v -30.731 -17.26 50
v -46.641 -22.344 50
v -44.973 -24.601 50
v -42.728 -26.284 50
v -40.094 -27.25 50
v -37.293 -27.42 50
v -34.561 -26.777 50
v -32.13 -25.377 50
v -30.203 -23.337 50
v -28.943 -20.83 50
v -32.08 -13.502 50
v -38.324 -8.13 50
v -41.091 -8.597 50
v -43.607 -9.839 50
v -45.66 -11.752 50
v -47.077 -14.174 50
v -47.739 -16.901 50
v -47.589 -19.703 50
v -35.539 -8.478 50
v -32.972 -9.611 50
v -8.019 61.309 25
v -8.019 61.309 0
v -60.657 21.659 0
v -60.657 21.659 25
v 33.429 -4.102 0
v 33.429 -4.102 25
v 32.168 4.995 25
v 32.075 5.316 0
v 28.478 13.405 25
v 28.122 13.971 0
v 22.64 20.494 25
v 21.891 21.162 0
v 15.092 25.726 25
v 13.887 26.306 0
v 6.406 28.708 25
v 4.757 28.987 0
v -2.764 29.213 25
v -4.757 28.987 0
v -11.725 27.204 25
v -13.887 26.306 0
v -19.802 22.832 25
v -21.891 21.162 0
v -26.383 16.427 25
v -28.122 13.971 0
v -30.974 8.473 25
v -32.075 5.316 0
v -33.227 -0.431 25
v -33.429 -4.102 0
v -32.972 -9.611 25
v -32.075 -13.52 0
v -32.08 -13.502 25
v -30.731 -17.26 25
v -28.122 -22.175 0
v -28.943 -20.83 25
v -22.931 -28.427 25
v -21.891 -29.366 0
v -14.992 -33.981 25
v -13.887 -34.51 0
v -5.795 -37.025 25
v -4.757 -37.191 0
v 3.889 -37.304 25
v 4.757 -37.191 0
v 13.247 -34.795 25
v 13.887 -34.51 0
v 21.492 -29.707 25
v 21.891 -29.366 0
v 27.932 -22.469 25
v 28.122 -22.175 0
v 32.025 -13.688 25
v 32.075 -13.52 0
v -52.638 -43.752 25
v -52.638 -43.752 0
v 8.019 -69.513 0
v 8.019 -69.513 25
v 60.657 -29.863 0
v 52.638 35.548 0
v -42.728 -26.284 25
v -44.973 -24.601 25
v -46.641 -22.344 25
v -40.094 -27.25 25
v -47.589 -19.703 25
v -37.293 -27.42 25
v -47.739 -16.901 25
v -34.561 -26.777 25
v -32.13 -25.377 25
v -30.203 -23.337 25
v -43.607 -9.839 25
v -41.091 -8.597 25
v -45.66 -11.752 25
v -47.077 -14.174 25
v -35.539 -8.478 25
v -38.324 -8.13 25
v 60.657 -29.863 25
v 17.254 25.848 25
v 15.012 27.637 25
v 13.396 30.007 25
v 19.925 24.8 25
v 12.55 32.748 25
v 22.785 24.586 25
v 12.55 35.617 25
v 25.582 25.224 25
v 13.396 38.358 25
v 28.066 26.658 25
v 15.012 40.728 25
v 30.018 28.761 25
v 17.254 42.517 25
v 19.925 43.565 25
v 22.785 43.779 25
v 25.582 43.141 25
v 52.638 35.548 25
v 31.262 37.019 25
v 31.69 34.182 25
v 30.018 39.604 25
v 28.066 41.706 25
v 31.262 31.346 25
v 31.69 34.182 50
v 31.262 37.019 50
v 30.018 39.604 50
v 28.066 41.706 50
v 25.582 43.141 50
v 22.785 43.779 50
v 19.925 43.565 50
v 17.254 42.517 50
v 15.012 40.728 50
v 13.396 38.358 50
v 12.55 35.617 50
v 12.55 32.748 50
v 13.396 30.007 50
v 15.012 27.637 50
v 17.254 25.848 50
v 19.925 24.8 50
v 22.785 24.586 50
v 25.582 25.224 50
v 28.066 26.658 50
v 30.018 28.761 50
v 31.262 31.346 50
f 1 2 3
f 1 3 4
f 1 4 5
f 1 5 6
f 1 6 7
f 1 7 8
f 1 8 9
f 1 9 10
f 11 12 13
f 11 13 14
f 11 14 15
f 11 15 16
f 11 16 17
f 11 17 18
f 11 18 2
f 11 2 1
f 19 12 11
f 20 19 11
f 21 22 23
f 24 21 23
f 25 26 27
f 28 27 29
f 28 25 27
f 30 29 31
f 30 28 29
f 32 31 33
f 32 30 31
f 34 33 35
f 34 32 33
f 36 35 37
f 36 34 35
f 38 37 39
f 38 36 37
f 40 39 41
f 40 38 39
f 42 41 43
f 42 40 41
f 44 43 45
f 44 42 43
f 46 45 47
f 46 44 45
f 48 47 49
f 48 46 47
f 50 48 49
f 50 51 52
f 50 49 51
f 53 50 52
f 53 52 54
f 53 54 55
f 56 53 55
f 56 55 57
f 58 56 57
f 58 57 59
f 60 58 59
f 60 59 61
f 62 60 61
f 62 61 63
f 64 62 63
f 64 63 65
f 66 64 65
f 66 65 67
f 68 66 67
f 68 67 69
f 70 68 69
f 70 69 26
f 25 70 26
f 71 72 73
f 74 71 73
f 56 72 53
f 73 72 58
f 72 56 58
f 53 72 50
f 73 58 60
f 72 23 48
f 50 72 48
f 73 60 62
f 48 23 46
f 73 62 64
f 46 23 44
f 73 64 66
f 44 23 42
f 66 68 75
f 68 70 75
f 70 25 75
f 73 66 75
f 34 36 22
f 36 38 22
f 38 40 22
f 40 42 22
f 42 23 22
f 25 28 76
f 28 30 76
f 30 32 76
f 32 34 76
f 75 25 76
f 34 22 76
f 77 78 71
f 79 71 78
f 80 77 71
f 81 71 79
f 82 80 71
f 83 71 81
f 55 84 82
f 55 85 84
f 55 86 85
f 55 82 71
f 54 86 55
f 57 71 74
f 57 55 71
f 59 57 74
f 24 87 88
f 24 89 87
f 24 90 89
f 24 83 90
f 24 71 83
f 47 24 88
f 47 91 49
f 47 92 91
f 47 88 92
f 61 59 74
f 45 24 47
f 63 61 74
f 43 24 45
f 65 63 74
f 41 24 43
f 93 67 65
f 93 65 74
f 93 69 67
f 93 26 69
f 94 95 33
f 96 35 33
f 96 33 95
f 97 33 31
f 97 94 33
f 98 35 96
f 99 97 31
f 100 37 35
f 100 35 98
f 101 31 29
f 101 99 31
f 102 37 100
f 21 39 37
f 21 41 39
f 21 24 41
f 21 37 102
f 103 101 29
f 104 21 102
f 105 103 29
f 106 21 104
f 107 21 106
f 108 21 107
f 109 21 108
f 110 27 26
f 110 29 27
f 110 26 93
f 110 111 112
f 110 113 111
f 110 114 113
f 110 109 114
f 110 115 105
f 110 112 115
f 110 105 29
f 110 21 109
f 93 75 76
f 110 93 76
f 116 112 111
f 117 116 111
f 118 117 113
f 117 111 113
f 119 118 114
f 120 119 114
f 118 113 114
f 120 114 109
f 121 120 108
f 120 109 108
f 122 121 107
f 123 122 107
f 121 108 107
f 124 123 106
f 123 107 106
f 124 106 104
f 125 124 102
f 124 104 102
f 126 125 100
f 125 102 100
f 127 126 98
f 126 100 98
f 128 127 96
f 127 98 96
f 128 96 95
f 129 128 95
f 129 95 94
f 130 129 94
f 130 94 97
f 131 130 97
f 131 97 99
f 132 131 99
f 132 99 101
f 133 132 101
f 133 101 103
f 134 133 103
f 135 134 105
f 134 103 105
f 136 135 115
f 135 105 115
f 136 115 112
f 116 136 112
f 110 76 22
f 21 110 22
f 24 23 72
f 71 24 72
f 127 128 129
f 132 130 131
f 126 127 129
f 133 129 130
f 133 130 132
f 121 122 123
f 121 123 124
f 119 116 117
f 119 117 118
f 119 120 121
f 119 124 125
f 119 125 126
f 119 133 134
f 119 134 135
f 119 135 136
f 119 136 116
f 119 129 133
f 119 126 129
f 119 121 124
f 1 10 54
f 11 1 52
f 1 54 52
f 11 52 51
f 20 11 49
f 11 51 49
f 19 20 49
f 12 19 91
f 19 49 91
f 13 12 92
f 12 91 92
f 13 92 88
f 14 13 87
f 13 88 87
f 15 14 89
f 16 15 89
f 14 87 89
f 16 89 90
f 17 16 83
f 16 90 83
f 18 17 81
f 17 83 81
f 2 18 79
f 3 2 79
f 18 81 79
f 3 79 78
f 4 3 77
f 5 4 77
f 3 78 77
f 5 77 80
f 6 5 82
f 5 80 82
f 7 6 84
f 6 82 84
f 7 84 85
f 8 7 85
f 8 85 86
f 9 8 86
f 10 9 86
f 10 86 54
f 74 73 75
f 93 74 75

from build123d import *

# Parameters (mm, degrees)
F0_R     = 33.4292406747
F1_DEPTH = 25
F2_R     = 9.6236756303
F3_DEPTH = 25


# Not quite as in the source:
# - after a boolean that leaves OpenCascade's solid faulty, fix() repairs it


with BuildPart() as f1:
    # F0 (on Top) → F1 (new body)
    with BuildSketch(Plane.XY):
        Polygon((-8.0187594833, 61.3087737227), (-60.6567287502, 21.6589621043), (-52.6379692669, -43.7517622936), (8.0187594833, -69.5126750732), (60.6567287502, -29.8628634548), (52.6379692669, 35.5478609431), align=None)
        with Locations((0, -4.1019506752)):
            Circle(F0_R, mode=Mode.SUBTRACT)
    extrude(amount=F1_DEPTH)

    # F2 (on face) → F3 (join)
    with BuildSketch(Plane.XY.offset(25)):
        with BuildLine():
            ThreePointArc((-28.942967923, -20.8297341476), (-31.4616986723, -15.4013156461), (-32.9722113693, -9.6107989674))
            ThreePointArc((-32.9722113693, -9.6107989674), (-47.2113068424, -21.0577353047), (-28.942967923, -20.8297341476))
        make_face()
        with Locations((22.0662225038, 34.1823846102)):
            Circle(F2_R)
    extrude(amount=F3_DEPTH)

    add(f1.part.fix(), mode=Mode.REPLACE)


solid = f1.part
